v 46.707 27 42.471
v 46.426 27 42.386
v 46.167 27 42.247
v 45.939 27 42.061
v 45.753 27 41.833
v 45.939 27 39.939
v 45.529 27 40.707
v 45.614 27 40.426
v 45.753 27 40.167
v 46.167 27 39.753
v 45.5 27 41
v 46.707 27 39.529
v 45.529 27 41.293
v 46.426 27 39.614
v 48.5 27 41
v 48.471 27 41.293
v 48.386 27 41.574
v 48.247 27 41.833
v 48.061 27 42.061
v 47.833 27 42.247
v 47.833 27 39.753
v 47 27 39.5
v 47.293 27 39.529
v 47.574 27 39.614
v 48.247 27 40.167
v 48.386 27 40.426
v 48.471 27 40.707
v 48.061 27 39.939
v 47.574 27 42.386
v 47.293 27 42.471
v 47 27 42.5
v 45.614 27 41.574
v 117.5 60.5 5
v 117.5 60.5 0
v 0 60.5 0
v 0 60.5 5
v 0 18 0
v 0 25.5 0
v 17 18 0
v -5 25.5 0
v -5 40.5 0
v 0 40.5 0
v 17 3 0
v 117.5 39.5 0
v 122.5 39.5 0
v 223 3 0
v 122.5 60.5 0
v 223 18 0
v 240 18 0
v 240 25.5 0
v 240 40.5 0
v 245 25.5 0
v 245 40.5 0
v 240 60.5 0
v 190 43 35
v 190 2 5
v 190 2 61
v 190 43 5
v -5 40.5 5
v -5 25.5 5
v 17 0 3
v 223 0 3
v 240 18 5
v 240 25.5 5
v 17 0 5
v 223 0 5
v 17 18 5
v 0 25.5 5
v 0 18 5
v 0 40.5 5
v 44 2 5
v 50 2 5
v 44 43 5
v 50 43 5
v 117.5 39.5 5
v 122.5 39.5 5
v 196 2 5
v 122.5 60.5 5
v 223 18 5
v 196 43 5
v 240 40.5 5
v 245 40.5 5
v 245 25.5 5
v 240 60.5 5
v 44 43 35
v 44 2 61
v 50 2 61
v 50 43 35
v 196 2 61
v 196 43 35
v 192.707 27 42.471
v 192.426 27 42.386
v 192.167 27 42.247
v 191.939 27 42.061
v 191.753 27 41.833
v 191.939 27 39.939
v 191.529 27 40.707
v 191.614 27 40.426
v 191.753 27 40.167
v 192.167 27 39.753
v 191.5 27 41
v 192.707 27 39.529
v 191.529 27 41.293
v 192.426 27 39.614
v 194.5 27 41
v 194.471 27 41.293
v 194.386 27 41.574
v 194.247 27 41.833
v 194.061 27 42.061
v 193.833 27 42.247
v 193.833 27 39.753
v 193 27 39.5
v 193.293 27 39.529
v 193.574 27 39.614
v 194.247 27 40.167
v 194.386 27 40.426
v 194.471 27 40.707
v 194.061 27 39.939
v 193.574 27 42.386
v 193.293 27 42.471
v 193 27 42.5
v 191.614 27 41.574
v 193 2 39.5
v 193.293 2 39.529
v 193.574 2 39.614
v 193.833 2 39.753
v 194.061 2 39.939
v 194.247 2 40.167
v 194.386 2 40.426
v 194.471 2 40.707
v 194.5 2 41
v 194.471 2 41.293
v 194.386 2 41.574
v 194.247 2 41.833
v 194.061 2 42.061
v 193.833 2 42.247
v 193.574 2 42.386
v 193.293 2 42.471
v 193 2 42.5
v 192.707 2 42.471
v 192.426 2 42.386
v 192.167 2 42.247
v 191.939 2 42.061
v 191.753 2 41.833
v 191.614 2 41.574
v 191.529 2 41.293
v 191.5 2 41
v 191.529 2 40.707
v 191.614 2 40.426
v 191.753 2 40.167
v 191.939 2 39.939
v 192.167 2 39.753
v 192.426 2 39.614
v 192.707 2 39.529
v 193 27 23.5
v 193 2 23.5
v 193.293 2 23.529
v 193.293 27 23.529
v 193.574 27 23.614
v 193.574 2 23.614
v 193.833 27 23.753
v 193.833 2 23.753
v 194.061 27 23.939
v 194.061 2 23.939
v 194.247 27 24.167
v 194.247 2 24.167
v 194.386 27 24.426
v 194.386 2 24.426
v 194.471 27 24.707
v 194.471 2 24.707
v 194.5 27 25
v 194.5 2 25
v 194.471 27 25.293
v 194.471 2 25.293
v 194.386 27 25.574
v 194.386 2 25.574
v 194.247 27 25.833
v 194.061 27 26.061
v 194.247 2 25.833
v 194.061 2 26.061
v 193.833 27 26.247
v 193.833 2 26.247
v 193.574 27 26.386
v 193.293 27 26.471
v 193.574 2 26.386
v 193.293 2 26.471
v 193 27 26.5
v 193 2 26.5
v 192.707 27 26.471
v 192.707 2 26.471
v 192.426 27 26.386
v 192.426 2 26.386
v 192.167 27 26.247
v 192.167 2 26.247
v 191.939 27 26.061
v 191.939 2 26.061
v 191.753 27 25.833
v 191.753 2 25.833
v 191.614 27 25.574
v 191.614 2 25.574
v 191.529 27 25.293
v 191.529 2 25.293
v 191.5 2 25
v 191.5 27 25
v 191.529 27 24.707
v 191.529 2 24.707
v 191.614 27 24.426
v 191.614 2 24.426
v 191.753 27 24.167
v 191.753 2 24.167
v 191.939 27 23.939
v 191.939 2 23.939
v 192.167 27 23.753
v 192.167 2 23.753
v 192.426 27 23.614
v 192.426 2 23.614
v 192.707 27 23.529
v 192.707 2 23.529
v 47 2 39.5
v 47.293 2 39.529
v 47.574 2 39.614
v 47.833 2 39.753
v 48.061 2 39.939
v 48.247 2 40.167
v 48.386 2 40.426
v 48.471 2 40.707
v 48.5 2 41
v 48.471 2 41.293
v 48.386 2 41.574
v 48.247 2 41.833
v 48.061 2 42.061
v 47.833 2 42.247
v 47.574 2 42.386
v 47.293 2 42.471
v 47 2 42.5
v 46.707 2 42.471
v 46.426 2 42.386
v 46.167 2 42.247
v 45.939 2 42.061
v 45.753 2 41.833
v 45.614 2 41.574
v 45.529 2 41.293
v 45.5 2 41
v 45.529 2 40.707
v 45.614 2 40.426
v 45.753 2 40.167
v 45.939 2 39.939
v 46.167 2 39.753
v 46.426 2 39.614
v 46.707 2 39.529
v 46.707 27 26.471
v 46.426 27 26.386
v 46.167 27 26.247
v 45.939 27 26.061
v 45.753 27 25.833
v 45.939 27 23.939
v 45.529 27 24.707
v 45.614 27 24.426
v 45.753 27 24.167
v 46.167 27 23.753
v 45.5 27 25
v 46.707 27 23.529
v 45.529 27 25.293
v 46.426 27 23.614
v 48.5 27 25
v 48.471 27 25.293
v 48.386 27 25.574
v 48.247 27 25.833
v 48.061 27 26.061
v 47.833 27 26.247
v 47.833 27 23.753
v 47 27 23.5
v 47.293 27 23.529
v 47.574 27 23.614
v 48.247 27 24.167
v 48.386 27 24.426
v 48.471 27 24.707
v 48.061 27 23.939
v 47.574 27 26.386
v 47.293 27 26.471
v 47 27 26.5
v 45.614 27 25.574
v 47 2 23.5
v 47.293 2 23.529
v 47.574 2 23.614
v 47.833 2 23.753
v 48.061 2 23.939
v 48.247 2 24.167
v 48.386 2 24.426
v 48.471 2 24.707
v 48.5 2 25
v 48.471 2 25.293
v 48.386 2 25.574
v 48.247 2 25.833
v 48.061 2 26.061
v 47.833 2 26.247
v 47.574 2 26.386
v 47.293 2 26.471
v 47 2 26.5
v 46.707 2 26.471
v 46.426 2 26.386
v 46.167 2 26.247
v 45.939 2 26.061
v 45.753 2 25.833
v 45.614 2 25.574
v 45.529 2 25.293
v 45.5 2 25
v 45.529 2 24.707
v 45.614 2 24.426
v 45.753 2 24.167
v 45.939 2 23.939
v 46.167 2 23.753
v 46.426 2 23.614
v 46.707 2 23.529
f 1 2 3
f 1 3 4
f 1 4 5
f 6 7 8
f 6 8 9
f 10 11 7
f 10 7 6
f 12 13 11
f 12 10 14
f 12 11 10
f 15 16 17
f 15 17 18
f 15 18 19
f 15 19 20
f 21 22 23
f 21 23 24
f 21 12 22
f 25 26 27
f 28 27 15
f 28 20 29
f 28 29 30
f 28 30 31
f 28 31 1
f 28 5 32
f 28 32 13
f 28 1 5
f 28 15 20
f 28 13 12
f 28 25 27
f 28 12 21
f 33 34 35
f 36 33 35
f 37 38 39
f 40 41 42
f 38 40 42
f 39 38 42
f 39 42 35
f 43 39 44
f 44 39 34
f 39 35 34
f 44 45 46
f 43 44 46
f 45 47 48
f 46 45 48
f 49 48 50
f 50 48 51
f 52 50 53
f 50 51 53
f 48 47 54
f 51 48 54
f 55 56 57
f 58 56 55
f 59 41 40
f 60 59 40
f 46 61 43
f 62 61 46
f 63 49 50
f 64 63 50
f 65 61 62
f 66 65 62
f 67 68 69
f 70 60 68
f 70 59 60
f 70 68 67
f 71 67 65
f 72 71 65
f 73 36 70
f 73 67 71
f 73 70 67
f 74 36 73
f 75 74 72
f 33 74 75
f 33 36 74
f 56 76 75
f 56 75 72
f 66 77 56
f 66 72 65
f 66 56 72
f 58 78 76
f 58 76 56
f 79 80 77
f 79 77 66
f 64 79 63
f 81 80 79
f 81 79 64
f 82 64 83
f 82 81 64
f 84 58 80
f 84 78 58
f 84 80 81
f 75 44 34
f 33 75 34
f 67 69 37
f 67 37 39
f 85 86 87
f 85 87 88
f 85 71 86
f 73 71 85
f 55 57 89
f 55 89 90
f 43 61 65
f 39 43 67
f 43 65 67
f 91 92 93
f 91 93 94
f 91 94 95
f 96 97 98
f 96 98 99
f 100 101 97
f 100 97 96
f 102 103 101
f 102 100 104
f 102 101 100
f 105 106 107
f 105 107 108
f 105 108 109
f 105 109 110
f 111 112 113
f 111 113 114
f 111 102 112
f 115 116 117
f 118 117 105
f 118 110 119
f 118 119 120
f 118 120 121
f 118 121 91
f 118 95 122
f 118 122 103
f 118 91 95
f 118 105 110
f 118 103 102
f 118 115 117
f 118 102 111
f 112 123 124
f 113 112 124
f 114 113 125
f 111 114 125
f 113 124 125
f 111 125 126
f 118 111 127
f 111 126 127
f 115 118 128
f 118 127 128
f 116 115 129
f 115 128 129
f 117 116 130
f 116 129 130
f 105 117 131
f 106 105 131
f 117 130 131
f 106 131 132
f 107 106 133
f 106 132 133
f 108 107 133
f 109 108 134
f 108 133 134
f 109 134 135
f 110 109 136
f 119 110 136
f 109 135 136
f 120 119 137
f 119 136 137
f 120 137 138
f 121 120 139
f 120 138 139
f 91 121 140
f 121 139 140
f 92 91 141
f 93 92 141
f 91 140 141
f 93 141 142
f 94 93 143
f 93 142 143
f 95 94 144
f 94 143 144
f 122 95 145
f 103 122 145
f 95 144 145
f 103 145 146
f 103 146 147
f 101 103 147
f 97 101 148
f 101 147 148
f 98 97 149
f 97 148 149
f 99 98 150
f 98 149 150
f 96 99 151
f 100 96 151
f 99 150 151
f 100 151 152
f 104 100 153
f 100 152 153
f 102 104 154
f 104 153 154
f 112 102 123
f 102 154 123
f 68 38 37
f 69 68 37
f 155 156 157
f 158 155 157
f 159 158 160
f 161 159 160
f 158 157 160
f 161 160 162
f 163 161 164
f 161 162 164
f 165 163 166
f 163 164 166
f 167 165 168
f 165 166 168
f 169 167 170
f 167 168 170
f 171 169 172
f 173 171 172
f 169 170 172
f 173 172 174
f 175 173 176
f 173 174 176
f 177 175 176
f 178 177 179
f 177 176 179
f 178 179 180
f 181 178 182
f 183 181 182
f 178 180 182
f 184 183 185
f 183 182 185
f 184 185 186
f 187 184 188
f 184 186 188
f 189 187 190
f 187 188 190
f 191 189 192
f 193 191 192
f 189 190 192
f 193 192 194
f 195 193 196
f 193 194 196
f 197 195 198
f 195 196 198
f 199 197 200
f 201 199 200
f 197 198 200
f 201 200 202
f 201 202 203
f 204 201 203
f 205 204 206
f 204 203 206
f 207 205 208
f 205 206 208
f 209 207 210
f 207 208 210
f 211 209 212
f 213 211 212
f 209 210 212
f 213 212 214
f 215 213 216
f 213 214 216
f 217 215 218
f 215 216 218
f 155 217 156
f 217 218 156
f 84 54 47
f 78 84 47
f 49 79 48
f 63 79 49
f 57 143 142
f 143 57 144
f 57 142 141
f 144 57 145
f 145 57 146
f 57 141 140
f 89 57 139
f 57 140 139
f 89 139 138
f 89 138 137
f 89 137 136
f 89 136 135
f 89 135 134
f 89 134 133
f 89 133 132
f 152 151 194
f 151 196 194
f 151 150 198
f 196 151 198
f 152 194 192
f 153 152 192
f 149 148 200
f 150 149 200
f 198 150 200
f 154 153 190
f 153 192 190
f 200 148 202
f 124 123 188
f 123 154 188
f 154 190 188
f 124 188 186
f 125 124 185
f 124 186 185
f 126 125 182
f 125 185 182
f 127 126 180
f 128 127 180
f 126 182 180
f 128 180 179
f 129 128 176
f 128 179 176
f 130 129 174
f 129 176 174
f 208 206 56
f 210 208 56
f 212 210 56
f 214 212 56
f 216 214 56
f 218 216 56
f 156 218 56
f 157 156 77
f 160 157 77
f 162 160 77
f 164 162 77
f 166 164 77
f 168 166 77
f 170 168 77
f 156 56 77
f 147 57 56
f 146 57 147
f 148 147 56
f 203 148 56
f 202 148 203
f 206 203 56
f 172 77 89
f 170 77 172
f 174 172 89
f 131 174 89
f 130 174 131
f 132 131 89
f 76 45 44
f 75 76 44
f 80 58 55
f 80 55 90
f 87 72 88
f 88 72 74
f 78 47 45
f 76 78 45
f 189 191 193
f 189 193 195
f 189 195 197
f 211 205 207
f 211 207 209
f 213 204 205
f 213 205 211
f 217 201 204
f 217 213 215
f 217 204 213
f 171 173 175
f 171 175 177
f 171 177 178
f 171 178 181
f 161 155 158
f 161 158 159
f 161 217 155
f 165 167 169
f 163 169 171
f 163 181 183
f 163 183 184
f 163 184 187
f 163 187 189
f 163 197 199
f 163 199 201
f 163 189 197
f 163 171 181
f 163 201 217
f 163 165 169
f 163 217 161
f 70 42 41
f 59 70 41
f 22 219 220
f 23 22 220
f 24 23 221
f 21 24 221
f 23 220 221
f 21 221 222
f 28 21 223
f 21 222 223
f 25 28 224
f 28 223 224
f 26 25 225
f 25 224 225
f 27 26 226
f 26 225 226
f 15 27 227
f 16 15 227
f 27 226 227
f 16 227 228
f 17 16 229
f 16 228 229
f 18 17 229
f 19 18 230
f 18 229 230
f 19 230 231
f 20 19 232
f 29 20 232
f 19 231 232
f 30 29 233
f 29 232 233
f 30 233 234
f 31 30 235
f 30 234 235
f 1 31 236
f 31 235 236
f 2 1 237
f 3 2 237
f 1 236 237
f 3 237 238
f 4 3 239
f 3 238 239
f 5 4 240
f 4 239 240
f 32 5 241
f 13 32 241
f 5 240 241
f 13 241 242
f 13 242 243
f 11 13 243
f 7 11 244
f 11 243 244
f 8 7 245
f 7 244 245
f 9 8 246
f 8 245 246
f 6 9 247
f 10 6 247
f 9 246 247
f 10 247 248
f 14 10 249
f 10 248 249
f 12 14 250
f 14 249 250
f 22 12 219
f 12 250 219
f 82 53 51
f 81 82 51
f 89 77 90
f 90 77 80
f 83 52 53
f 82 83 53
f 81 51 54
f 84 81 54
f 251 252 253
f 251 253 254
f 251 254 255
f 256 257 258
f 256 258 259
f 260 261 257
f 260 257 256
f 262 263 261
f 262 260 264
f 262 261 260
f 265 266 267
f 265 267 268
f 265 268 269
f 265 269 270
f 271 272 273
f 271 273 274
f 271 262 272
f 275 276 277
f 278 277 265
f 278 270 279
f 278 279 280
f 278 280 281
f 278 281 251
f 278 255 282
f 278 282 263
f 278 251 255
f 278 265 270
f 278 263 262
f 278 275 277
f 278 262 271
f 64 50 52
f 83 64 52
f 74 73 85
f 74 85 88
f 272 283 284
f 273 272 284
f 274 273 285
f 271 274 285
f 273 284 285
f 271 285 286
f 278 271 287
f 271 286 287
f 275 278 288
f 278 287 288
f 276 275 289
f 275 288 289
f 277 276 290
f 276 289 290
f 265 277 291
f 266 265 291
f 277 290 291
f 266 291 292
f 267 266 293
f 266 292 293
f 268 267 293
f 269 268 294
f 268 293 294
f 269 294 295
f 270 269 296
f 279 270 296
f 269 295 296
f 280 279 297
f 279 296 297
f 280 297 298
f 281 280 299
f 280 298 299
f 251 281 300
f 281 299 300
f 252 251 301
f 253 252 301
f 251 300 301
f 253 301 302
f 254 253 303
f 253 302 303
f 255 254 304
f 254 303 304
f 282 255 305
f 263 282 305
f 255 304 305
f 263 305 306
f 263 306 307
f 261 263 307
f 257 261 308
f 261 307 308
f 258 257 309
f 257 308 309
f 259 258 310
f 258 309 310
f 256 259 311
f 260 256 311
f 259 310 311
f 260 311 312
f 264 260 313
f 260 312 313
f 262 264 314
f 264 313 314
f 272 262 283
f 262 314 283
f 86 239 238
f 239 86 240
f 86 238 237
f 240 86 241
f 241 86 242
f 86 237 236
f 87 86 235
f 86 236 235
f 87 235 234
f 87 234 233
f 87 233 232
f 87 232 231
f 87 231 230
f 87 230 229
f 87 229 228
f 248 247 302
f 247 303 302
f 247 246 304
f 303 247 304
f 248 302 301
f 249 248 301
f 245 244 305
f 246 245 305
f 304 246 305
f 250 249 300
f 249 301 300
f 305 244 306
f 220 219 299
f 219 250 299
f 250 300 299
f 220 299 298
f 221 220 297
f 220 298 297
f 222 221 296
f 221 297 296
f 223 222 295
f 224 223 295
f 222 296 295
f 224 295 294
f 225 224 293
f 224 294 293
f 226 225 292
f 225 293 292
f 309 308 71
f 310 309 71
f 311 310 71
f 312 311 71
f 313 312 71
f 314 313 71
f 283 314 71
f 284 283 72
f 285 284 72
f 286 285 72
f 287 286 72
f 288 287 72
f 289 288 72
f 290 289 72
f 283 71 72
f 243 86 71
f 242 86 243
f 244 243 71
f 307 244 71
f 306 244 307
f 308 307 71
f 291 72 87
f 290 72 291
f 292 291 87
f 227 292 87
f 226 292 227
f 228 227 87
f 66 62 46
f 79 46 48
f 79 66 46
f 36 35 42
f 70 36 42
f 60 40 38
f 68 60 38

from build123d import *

# Parameters (mm, degrees)
BOSS_EXTRU_1_DEPTH      = 5
ESQUISSE2_W             = 17
ESQUISSE2_H             = 18
ENL_V_MAT_EXTRU_1_DEPTH = 253.408894455
ESQUISSE3_W             = 6
ESQUISSE3_H             = 41
BOSS_EXTRU_2_DEPTH      = 70
ENL_V_MAT_EXTRU_3_DEPTH = 223.904127373
CHANFREIN1_SIZE         = 3
ESQUISSE7_R             = 1.5
ENL_V_MAT_EXTRU_4_DEPTH = 25


# Read off the part's stored shape, not the designer's step: Boss.-Extru.1
with BuildPart() as part:
    # Boss.-Extru.1 outline → Boss.-Extru.1 (new body)
    with BuildSketch(Plane.XY):
        Polygon((0, 25.5), (0, 0), (240, 0), (240, 25.5), (245, 25.5), (245, 40.5), (240, 40.5), (240, 60.5), (122.5, 60.5), (122.5, 39.5), (117.5, 39.5), (117.5, 60.5), (0, 60.5), (0, 40.5), (-5, 40.5), (-5, 25.5), align=None)
    extrude(amount=BOSS_EXTRU_1_DEPTH)

    # Esquisse2 → Enlèv. mat.-Extru.1 (cut, through all)
    with BuildSketch(Plane.XY.offset(5)):
        with Locations((231.5, 9)):
            Rectangle(ESQUISSE2_W, ESQUISSE2_H)
        with Locations((8.5, 9)):
            Rectangle(ESQUISSE2_W, ESQUISSE2_H)
    extrude(amount=-ENL_V_MAT_EXTRU_1_DEPTH, mode=Mode.SUBTRACT)

    # Esquisse3 → Boss.-Extru.2 (add)
    with BuildSketch(Plane.XY.offset(5)):
        with Locations((47, 22.5)):
            Rectangle(ESQUISSE3_W, ESQUISSE3_H)
        with Locations((193, 22.5)):
            Rectangle(ESQUISSE3_W, ESQUISSE3_H)
    extrude(amount=BOSS_EXTRU_2_DEPTH)

    # Esquisse6 → Enlèv. mat.-Extru.3 (cut, through all)
    with BuildSketch(Plane.ZY.offset(-44)):
        Polygon((35, 43), (75, 43), (75, 2), (61, 2), align=None)
    extrude(amount=-ENL_V_MAT_EXTRU_3_DEPTH, mode=Mode.SUBTRACT)

    # Chanfrein1
    chanfrein1_edges = [part.edges().sort_by_distance(p)[0] for p in [
        (120, 0, 0),
    ]]
    chamfer(chanfrein1_edges, length=CHANFREIN1_SIZE)

    # Esquisse7 → Enlèv. mat.-Extru.4 (cut)
    with BuildSketch(Plane.XZ.offset(-2)):
        with Locations(Location((47, 25, 0), (0, 0, 270))):
            Circle(ESQUISSE7_R)
        with Locations(Location((47, 41, 0), (0, 0, 270))):
            Circle(ESQUISSE7_R)
        with Locations(Location((193, 41, 0), (0, 0, 270))):
            Circle(ESQUISSE7_R)
        with Locations(Location((193, 25, 0), (0, 0, 270))):
            Circle(ESQUISSE7_R)
    extrude(amount=-ENL_V_MAT_EXTRU_4_DEPTH, mode=Mode.SUBTRACT)


solid = part.part
